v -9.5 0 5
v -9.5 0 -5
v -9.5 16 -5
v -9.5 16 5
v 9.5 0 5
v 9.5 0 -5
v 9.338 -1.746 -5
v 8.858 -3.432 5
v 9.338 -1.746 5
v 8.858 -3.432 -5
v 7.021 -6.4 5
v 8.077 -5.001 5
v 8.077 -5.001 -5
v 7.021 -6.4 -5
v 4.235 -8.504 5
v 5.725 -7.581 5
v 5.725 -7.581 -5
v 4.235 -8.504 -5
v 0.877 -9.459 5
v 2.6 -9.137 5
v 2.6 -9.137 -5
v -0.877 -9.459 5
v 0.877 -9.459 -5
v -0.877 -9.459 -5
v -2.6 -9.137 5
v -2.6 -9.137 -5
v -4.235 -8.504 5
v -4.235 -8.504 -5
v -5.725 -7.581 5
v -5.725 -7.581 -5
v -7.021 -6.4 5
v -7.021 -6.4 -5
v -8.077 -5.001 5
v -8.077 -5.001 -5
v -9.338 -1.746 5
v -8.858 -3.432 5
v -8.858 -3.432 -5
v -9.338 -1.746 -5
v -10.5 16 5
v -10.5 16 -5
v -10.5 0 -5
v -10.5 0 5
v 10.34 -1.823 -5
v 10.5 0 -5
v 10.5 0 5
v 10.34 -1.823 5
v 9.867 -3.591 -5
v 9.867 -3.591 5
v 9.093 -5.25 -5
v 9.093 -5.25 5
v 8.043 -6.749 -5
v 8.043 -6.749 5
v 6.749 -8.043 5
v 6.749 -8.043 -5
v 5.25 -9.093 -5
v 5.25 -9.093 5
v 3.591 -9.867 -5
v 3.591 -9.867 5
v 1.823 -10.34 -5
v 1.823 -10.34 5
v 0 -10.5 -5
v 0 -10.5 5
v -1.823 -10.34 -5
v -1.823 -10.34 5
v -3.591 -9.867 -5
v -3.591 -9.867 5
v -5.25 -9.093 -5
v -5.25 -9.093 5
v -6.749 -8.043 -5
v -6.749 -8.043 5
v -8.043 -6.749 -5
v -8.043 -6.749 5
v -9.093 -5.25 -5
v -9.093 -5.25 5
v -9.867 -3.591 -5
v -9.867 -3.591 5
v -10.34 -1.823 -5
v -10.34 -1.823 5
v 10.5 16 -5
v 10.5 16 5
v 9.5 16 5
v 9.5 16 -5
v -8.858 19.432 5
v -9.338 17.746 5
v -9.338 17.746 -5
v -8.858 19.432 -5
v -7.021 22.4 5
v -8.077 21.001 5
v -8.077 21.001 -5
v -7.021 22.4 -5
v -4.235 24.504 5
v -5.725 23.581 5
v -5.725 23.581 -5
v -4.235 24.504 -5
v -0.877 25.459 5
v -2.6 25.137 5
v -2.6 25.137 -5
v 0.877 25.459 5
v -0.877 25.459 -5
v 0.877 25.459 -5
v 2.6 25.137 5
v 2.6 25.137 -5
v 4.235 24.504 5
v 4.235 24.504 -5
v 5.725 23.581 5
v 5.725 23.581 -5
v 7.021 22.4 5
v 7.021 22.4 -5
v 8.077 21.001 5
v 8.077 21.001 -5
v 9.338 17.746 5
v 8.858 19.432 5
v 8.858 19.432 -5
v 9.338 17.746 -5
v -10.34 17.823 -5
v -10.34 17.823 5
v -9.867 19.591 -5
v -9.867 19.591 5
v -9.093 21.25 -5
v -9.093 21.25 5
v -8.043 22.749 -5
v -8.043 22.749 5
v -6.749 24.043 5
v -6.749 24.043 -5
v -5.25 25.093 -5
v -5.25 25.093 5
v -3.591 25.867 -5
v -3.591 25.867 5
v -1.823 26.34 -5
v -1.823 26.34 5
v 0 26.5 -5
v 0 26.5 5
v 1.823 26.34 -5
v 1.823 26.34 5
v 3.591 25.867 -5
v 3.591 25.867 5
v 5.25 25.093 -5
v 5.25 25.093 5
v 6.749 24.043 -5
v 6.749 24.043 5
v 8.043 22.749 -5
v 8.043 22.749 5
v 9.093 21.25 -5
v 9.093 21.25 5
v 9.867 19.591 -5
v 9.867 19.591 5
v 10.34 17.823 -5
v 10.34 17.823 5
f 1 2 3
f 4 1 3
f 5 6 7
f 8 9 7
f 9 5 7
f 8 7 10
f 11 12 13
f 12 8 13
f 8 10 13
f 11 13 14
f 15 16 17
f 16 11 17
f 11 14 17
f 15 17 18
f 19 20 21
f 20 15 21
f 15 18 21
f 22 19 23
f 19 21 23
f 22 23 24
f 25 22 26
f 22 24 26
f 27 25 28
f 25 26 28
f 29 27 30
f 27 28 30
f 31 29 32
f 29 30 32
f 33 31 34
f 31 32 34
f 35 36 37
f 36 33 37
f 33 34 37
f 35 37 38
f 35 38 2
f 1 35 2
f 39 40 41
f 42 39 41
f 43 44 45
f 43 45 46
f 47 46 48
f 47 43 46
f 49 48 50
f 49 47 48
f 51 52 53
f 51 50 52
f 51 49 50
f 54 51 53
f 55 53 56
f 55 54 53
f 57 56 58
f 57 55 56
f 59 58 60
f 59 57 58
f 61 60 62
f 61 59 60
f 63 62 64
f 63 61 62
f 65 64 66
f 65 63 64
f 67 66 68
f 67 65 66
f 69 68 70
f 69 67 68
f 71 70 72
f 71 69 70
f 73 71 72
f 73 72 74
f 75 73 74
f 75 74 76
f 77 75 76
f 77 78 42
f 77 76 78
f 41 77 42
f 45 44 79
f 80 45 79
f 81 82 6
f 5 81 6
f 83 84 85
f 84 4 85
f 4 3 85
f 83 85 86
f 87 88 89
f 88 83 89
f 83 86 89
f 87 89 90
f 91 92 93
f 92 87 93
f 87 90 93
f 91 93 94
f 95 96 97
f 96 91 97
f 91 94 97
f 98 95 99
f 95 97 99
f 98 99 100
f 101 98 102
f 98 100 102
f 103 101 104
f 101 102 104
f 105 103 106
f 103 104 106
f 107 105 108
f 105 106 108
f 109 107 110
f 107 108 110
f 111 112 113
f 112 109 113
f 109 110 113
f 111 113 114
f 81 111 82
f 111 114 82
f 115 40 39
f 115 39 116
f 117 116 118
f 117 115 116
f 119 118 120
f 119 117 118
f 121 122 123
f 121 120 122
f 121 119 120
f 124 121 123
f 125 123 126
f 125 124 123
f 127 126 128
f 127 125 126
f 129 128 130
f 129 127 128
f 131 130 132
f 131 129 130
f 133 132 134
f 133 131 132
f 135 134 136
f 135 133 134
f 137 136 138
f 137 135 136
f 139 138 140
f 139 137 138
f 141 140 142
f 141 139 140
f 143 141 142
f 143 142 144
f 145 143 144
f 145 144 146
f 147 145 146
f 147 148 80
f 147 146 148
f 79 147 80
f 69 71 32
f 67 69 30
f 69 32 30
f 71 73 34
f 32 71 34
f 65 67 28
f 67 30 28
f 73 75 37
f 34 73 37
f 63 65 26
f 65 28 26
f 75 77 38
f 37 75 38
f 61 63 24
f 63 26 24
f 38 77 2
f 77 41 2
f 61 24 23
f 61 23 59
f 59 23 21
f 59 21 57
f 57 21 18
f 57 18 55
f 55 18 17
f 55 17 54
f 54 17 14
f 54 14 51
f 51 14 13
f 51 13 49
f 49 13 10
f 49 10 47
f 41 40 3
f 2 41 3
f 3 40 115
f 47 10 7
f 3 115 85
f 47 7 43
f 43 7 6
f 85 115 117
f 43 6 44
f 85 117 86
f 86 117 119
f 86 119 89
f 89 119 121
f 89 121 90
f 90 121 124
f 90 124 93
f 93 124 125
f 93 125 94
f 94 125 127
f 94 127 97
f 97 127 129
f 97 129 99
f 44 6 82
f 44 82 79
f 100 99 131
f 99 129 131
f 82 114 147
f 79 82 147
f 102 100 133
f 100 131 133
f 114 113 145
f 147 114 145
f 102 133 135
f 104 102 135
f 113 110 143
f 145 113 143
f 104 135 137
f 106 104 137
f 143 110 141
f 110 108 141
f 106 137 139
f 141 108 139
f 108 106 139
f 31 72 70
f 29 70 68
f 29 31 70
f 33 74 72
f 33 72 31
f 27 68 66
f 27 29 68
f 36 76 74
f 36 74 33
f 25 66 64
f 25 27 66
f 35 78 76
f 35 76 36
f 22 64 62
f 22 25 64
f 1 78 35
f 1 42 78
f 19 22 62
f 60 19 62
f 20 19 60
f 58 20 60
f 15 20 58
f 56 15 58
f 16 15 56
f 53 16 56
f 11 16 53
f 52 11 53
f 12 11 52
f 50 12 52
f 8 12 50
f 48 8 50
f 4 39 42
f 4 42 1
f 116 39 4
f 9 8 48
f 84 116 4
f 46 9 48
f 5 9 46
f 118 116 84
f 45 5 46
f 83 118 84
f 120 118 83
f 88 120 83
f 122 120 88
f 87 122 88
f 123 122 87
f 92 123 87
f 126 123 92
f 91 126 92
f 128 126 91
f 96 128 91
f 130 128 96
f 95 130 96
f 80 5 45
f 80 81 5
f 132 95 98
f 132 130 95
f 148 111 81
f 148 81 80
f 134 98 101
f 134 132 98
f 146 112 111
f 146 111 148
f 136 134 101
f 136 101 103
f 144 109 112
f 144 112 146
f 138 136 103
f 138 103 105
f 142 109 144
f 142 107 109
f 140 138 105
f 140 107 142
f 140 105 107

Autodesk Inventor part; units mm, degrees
ref_plane "YZ Plane" through (0, 0, 0) normal (1, 0, 0) x (0, 1, 0)
ref_plane "XZ Plane" through (0, 0, 0) normal (0, 1, 0) x (-1, 0, 0)
ref_plane "XY Plane" through (0, 0, 0) normal (0, 0, 1) x (1, 0, 0)
sketch "Sketch1" plane through (0, 0, 0) normal (0, 0, 1) x (1, 0, 0)
  line L0 (0, 0) -> (0, 16) construction
  line L1 (-9.5, 0) -> (-9.5, 16)
  line L2 (9.5, 16) -> (9.5, 0)
  arc A0 (-9.5, 0) -> (9.5, 0) centre (0, 0) ccw
  arc A1 (9.5, 16) -> (-9.5, 16) centre (0, 16) ccw
  line L3 (-10.5, 16) -> (-10.5, 0)
  arc A2 (-10.5, 0) -> (10.5, 0) centre (0, 0) ccw
  line L4 (10.5, 0) -> (10.5, 16)
  arc A3 (10.5, 16) -> (-10.5, 16) centre (0, 16) ccw
  point P0 (0, 8)
  dimension "d3" = 9.5
  dimension "d4" = 16
  dimension "d5" = 1
extrude "Extrusion1" add sketch "Sketch1" along normal mid plane 10
properties part number "Colierî"
